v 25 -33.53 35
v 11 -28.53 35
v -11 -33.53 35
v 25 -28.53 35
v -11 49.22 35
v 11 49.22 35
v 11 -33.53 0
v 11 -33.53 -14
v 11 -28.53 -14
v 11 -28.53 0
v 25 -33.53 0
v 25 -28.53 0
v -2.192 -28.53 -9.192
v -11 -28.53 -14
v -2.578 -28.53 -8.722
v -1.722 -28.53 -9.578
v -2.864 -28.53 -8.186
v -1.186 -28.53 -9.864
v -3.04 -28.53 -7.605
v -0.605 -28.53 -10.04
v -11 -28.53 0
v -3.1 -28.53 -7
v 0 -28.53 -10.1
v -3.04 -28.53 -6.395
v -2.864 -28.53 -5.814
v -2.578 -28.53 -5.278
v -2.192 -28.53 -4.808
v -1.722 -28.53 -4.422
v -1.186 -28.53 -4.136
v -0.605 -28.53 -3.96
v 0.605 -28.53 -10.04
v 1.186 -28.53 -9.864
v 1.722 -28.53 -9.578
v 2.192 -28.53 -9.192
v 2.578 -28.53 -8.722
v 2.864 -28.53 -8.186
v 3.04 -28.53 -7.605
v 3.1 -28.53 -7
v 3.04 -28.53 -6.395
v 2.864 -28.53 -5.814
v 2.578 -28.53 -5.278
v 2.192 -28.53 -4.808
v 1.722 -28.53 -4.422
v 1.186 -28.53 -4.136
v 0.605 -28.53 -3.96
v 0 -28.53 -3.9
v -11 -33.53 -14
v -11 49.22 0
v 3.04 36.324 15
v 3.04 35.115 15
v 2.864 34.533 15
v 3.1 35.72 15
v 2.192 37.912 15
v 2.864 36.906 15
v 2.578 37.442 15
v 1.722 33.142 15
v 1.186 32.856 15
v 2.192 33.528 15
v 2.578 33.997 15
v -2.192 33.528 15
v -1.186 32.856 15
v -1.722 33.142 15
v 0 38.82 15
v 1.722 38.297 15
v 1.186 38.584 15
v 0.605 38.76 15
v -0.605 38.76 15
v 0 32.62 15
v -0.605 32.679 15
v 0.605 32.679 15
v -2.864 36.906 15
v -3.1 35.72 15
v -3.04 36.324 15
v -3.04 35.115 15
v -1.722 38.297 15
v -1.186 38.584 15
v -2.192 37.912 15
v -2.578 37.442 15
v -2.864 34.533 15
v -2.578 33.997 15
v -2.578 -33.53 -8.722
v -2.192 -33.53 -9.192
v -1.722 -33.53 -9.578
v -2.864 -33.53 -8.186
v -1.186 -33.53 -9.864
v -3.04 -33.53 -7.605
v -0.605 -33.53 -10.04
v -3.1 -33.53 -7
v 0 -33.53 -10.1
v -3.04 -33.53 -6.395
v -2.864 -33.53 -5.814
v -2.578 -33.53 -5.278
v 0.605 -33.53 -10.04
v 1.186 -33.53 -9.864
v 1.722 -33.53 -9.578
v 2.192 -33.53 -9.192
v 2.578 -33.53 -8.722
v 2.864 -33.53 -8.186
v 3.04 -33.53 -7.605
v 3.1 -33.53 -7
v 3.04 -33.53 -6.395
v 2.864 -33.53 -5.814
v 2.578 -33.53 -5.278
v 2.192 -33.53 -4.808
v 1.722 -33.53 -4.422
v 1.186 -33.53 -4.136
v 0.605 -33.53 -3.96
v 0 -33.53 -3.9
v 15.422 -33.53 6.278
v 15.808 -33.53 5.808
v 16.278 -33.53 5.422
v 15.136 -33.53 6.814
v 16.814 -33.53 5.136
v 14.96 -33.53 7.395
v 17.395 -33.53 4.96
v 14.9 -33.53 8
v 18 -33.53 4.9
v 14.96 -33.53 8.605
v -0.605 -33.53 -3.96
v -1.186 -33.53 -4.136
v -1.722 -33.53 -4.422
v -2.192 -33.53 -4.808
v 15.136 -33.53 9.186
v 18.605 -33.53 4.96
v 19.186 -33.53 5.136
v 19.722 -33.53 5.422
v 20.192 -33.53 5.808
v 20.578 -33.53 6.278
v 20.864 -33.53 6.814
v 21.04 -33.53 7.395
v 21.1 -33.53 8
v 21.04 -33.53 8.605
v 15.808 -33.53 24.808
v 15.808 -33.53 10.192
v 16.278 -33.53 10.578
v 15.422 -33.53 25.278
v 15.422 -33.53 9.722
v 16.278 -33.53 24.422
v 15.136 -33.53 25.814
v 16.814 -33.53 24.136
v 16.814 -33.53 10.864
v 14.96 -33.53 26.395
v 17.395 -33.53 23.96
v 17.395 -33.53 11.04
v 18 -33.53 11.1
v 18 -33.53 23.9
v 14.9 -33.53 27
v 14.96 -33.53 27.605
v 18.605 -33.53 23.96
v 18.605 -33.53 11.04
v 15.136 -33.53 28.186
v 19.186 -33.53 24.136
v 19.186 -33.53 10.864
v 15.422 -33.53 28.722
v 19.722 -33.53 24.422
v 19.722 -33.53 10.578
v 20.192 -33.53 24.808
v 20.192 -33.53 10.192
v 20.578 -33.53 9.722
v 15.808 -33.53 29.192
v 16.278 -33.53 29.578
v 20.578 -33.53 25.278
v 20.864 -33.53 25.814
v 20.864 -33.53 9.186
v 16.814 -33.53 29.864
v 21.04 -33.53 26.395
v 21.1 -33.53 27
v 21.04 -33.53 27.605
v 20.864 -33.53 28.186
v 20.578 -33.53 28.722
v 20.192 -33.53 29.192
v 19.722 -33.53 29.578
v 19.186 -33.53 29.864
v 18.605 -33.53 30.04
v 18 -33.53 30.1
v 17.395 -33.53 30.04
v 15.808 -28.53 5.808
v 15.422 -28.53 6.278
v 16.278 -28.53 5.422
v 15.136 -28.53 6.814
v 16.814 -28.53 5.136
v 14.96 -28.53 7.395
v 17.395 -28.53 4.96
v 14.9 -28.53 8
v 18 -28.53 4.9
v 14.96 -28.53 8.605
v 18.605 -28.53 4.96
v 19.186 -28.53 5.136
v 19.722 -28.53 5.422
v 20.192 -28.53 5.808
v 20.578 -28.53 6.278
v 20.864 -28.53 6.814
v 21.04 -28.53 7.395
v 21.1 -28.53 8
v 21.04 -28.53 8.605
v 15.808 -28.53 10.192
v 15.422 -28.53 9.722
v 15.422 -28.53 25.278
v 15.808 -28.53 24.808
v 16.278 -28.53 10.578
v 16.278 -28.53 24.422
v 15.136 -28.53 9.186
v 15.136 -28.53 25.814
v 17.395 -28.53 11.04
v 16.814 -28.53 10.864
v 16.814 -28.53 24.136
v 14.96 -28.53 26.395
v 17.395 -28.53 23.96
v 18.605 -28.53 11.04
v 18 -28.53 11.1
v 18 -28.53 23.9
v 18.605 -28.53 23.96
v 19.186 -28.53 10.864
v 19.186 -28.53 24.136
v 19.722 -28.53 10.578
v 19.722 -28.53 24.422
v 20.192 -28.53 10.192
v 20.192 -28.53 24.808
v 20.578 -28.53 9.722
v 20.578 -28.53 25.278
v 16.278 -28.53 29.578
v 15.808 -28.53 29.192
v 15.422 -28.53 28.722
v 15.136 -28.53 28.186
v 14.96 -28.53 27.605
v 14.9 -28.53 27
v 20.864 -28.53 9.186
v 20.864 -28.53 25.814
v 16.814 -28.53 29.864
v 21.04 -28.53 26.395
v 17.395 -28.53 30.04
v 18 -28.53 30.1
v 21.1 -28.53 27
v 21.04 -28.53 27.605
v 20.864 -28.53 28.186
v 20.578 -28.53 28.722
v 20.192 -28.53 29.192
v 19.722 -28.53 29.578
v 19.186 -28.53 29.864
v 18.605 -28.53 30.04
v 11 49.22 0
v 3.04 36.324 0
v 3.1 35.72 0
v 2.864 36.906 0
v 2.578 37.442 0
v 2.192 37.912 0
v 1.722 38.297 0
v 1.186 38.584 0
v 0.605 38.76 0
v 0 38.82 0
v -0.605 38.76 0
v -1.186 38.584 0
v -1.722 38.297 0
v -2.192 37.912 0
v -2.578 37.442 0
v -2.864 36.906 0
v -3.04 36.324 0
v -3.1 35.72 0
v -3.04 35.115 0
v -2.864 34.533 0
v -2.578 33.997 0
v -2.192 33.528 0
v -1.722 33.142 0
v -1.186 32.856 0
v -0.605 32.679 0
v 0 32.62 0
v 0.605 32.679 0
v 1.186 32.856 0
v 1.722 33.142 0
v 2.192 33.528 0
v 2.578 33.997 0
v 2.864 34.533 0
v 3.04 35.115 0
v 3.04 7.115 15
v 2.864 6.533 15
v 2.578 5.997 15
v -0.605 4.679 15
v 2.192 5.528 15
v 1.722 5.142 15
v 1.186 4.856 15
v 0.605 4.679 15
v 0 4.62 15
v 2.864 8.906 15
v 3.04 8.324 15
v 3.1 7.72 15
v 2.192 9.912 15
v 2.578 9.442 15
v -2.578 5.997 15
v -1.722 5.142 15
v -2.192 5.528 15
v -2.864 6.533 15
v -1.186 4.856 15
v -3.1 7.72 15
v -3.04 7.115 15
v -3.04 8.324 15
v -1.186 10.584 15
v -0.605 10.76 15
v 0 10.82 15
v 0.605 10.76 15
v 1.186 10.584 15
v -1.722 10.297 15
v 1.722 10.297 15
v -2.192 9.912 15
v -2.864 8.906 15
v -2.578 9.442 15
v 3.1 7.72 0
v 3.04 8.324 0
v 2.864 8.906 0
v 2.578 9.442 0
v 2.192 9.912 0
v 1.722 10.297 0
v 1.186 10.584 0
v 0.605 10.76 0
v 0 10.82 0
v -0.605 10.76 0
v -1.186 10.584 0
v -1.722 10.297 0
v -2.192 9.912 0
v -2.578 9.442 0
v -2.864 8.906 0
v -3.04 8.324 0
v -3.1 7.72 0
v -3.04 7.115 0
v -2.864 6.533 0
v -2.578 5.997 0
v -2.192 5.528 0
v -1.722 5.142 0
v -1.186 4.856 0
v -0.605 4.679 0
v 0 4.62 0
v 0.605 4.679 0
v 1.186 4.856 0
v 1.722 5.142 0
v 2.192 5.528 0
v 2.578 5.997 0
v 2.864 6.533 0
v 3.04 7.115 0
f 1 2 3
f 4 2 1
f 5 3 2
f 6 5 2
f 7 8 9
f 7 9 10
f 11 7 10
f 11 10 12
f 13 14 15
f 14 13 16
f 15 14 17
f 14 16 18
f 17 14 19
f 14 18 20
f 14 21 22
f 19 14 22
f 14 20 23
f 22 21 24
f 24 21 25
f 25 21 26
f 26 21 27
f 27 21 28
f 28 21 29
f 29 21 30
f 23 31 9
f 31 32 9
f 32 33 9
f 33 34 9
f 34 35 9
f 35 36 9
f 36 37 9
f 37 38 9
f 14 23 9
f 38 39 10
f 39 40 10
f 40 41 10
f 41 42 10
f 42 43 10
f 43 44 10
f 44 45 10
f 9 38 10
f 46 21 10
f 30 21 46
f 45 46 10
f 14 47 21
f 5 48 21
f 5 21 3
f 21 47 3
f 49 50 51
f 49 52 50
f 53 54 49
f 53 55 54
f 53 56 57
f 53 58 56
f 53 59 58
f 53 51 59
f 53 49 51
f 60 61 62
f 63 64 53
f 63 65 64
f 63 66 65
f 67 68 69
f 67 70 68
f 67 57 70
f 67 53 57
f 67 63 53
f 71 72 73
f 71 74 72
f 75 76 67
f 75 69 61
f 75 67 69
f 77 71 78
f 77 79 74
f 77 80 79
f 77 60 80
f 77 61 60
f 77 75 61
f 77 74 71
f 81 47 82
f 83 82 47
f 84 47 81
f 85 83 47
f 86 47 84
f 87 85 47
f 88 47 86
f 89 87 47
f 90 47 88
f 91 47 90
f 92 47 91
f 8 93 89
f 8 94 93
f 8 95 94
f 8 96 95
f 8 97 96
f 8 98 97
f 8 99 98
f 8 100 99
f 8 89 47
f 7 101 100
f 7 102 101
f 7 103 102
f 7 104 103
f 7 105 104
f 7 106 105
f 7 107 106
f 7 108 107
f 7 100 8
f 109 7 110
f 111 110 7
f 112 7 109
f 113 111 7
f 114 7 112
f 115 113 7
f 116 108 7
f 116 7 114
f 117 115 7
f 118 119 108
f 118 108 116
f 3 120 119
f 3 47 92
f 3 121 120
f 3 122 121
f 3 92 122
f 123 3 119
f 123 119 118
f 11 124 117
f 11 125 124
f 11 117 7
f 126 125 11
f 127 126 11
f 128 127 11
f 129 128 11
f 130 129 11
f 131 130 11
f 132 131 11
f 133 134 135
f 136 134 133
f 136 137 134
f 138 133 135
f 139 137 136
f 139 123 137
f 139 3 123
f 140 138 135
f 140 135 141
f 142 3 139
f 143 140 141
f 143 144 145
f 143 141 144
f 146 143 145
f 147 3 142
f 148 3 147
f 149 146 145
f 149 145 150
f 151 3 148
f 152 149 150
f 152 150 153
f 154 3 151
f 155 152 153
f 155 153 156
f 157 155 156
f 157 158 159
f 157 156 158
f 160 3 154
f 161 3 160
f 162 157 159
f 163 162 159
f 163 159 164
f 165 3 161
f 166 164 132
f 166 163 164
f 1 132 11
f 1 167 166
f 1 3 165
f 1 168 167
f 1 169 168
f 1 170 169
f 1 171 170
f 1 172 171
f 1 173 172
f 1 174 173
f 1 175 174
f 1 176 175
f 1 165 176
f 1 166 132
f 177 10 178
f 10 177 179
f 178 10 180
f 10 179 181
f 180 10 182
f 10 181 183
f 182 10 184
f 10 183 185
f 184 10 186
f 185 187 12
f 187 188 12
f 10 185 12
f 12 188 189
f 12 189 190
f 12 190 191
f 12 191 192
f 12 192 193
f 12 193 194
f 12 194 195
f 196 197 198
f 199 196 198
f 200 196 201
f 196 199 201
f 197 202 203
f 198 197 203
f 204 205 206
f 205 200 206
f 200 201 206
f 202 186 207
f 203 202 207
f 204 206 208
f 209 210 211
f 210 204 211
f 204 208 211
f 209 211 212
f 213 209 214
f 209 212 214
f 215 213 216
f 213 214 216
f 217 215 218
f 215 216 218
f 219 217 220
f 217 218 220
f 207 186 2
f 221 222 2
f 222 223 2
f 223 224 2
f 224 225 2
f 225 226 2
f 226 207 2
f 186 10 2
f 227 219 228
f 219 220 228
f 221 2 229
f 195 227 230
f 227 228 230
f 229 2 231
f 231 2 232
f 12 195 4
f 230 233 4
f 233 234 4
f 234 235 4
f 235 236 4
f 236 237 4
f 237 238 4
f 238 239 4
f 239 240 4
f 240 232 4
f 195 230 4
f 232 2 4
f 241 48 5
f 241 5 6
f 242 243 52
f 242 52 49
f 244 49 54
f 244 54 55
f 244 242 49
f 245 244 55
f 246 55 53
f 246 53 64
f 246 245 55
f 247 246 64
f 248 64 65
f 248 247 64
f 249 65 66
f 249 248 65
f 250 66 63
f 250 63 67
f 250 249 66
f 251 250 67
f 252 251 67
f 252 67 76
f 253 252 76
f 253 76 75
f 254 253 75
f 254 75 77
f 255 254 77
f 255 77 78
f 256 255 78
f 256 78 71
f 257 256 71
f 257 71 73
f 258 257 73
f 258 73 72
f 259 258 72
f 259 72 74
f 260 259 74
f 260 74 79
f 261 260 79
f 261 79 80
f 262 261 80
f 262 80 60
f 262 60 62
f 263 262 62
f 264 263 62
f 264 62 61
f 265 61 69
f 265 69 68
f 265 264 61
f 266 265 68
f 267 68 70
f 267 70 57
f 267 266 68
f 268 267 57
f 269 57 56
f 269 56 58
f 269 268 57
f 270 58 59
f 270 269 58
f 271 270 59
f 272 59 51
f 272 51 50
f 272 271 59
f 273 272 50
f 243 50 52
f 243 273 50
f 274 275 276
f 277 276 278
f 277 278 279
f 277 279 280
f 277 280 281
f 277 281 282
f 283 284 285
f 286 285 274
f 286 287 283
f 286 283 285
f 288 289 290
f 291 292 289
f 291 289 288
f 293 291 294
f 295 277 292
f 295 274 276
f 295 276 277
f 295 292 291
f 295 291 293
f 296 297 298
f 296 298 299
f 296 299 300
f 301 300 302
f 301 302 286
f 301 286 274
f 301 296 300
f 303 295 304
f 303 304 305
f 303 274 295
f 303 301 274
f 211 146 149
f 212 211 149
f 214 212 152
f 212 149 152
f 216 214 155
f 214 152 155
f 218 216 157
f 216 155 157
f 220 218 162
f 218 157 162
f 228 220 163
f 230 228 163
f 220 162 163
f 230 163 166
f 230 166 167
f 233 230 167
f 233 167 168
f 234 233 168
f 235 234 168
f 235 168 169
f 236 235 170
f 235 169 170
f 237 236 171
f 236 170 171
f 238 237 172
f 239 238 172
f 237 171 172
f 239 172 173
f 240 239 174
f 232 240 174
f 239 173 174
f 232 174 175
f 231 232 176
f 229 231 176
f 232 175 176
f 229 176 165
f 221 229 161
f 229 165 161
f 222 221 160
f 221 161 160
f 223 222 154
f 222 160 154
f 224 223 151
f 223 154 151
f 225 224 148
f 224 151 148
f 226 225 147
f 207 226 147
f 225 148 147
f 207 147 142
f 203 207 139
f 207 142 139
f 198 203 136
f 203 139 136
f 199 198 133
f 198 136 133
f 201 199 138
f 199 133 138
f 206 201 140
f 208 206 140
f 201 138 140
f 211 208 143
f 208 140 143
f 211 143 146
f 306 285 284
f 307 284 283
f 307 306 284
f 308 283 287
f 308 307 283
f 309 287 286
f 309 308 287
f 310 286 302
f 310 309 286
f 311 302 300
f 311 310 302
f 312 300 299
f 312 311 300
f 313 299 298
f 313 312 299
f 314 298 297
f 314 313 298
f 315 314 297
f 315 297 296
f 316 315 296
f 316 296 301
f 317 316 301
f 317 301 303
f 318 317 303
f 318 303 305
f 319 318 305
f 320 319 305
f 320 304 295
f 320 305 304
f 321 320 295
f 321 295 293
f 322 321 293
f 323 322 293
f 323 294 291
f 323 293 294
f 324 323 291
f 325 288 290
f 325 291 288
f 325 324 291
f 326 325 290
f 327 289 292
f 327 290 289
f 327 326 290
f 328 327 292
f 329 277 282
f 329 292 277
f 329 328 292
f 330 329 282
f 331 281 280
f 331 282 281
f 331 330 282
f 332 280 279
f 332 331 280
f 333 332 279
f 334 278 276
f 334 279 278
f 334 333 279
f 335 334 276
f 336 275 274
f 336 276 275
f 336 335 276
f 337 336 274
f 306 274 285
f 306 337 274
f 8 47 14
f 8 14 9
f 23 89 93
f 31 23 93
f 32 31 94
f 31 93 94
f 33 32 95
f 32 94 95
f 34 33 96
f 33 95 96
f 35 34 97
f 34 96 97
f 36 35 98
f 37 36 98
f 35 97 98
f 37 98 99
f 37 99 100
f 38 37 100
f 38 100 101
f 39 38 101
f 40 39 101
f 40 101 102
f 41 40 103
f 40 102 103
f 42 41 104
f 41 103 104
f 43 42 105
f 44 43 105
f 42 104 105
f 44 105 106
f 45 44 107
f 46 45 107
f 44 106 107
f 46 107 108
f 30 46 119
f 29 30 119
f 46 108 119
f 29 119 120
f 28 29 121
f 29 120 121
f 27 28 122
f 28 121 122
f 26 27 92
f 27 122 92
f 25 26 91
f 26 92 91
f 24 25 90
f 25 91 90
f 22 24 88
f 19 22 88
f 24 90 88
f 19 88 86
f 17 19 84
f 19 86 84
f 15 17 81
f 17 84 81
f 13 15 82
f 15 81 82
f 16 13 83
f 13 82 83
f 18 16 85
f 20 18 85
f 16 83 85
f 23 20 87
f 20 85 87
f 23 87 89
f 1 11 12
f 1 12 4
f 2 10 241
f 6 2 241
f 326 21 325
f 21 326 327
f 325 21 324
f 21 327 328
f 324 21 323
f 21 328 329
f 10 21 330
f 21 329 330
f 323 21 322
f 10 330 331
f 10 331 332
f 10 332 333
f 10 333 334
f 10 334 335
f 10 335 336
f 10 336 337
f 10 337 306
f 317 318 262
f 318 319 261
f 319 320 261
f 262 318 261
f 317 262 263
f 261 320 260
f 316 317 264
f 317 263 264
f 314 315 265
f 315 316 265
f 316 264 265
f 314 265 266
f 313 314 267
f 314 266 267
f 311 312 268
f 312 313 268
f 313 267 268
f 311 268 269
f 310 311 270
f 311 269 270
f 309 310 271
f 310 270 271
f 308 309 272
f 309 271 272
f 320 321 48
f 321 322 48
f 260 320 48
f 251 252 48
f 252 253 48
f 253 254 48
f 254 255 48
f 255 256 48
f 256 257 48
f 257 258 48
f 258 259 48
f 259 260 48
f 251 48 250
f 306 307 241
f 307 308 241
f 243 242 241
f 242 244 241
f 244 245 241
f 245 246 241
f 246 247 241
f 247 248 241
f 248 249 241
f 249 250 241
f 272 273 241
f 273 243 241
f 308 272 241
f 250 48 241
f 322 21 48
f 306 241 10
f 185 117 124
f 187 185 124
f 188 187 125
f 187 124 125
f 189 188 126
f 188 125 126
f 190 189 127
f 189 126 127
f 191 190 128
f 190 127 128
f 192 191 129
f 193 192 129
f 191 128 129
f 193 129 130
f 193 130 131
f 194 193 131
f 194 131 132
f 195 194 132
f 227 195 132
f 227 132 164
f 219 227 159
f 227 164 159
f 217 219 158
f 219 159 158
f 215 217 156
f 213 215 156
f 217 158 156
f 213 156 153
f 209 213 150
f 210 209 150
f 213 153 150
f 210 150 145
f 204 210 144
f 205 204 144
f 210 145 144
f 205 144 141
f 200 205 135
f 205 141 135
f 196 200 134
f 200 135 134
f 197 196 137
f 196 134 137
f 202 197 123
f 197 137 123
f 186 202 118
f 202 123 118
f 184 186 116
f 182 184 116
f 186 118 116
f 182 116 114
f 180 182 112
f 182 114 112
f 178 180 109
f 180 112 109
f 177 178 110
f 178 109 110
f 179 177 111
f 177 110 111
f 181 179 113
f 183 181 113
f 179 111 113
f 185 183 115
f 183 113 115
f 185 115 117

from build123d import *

# Parameters (mm, degrees)
SKETCH1_W           = 22
SKETCH1_H           = 82.75
SKETCH1_R           = 3.1
BOSS_EXTRUDE1_DEPTH = 30
SKETCH2_W           = 22
SKETCH2_H           = 82.75
BOSS_EXTRUDE2_DEPTH = 5
SKETCH3_W           = 22
SKETCH3_H           = 14
SKETCH3_R           = 3.1
SKETCH3_W_2         = 14
SKETCH3_H_2         = 35
BOSS_EXTRUDE3_DEPTH = 5
BOSS_EXTRUDE5_START = 15
SKETCH5_R           = 3.1
BOSS_EXTRUDE5_DEPTH = 15


with BuildPart() as part:
    # Sketch1 → Boss-Extrude1 (new body)
    with BuildSketch(Plane.XY):
        with Locations((0, 7.844654309)):
            Rectangle(SKETCH1_W, SKETCH1_H)
        with Locations((0, 35.719654309)):
            Circle(SKETCH1_R, mode=Mode.SUBTRACT)
        with Locations((0, 7.719654309)):
            Circle(SKETCH1_R, mode=Mode.SUBTRACT)
    extrude(amount=BOSS_EXTRUDE1_DEPTH)

    # Sketch2 → Boss-Extrude2 (add)
    with BuildSketch(Plane.XY.offset(30)):
        with Locations((0, 7.844654309)):
            Rectangle(SKETCH2_W, SKETCH2_H)
    extrude(amount=BOSS_EXTRUDE2_DEPTH)

    # Sketch3 → Boss-Extrude3 (add)
    # profile 1 of 2: a face of its own
    with BuildSketch(Plane.XZ.offset(33.530345691)):
        with Locations((0, -7)):
            Rectangle(SKETCH3_W, SKETCH3_H)
        with Locations(Location((0, -7, 0), (0, 0, 270))):
            Circle(SKETCH3_R, mode=Mode.SUBTRACT)
    # profile 2 of 2: a face of its own
    with BuildSketch(Plane.XZ.offset(33.530345691)):
        with Locations((18, 17.5)):
            Rectangle(SKETCH3_W_2, SKETCH3_H_2)
        with Locations(Location((18, 27, 0), (0, 0, 270))):
            Circle(SKETCH3_R, mode=Mode.SUBTRACT)
        with Locations(Location((18, 8, 0), (0, 0, 270))):
            Circle(SKETCH3_R, mode=Mode.SUBTRACT)
    extrude(amount=-BOSS_EXTRUDE3_DEPTH)

    # Sketch5 → Boss-Extrude5 (add)
    with BuildSketch(Plane(origin=(0, 0, 30), x_dir=(-1, 0, 0), z_dir=(0, 0, -1)).offset(BOSS_EXTRUDE5_START)):
        with Locations((0, 7.719654309)):
            Circle(SKETCH5_R)
        with Locations((0, 35.719654309)):
            Circle(SKETCH5_R)
    extrude(amount=-BOSS_EXTRUDE5_DEPTH)


solid = part.part
